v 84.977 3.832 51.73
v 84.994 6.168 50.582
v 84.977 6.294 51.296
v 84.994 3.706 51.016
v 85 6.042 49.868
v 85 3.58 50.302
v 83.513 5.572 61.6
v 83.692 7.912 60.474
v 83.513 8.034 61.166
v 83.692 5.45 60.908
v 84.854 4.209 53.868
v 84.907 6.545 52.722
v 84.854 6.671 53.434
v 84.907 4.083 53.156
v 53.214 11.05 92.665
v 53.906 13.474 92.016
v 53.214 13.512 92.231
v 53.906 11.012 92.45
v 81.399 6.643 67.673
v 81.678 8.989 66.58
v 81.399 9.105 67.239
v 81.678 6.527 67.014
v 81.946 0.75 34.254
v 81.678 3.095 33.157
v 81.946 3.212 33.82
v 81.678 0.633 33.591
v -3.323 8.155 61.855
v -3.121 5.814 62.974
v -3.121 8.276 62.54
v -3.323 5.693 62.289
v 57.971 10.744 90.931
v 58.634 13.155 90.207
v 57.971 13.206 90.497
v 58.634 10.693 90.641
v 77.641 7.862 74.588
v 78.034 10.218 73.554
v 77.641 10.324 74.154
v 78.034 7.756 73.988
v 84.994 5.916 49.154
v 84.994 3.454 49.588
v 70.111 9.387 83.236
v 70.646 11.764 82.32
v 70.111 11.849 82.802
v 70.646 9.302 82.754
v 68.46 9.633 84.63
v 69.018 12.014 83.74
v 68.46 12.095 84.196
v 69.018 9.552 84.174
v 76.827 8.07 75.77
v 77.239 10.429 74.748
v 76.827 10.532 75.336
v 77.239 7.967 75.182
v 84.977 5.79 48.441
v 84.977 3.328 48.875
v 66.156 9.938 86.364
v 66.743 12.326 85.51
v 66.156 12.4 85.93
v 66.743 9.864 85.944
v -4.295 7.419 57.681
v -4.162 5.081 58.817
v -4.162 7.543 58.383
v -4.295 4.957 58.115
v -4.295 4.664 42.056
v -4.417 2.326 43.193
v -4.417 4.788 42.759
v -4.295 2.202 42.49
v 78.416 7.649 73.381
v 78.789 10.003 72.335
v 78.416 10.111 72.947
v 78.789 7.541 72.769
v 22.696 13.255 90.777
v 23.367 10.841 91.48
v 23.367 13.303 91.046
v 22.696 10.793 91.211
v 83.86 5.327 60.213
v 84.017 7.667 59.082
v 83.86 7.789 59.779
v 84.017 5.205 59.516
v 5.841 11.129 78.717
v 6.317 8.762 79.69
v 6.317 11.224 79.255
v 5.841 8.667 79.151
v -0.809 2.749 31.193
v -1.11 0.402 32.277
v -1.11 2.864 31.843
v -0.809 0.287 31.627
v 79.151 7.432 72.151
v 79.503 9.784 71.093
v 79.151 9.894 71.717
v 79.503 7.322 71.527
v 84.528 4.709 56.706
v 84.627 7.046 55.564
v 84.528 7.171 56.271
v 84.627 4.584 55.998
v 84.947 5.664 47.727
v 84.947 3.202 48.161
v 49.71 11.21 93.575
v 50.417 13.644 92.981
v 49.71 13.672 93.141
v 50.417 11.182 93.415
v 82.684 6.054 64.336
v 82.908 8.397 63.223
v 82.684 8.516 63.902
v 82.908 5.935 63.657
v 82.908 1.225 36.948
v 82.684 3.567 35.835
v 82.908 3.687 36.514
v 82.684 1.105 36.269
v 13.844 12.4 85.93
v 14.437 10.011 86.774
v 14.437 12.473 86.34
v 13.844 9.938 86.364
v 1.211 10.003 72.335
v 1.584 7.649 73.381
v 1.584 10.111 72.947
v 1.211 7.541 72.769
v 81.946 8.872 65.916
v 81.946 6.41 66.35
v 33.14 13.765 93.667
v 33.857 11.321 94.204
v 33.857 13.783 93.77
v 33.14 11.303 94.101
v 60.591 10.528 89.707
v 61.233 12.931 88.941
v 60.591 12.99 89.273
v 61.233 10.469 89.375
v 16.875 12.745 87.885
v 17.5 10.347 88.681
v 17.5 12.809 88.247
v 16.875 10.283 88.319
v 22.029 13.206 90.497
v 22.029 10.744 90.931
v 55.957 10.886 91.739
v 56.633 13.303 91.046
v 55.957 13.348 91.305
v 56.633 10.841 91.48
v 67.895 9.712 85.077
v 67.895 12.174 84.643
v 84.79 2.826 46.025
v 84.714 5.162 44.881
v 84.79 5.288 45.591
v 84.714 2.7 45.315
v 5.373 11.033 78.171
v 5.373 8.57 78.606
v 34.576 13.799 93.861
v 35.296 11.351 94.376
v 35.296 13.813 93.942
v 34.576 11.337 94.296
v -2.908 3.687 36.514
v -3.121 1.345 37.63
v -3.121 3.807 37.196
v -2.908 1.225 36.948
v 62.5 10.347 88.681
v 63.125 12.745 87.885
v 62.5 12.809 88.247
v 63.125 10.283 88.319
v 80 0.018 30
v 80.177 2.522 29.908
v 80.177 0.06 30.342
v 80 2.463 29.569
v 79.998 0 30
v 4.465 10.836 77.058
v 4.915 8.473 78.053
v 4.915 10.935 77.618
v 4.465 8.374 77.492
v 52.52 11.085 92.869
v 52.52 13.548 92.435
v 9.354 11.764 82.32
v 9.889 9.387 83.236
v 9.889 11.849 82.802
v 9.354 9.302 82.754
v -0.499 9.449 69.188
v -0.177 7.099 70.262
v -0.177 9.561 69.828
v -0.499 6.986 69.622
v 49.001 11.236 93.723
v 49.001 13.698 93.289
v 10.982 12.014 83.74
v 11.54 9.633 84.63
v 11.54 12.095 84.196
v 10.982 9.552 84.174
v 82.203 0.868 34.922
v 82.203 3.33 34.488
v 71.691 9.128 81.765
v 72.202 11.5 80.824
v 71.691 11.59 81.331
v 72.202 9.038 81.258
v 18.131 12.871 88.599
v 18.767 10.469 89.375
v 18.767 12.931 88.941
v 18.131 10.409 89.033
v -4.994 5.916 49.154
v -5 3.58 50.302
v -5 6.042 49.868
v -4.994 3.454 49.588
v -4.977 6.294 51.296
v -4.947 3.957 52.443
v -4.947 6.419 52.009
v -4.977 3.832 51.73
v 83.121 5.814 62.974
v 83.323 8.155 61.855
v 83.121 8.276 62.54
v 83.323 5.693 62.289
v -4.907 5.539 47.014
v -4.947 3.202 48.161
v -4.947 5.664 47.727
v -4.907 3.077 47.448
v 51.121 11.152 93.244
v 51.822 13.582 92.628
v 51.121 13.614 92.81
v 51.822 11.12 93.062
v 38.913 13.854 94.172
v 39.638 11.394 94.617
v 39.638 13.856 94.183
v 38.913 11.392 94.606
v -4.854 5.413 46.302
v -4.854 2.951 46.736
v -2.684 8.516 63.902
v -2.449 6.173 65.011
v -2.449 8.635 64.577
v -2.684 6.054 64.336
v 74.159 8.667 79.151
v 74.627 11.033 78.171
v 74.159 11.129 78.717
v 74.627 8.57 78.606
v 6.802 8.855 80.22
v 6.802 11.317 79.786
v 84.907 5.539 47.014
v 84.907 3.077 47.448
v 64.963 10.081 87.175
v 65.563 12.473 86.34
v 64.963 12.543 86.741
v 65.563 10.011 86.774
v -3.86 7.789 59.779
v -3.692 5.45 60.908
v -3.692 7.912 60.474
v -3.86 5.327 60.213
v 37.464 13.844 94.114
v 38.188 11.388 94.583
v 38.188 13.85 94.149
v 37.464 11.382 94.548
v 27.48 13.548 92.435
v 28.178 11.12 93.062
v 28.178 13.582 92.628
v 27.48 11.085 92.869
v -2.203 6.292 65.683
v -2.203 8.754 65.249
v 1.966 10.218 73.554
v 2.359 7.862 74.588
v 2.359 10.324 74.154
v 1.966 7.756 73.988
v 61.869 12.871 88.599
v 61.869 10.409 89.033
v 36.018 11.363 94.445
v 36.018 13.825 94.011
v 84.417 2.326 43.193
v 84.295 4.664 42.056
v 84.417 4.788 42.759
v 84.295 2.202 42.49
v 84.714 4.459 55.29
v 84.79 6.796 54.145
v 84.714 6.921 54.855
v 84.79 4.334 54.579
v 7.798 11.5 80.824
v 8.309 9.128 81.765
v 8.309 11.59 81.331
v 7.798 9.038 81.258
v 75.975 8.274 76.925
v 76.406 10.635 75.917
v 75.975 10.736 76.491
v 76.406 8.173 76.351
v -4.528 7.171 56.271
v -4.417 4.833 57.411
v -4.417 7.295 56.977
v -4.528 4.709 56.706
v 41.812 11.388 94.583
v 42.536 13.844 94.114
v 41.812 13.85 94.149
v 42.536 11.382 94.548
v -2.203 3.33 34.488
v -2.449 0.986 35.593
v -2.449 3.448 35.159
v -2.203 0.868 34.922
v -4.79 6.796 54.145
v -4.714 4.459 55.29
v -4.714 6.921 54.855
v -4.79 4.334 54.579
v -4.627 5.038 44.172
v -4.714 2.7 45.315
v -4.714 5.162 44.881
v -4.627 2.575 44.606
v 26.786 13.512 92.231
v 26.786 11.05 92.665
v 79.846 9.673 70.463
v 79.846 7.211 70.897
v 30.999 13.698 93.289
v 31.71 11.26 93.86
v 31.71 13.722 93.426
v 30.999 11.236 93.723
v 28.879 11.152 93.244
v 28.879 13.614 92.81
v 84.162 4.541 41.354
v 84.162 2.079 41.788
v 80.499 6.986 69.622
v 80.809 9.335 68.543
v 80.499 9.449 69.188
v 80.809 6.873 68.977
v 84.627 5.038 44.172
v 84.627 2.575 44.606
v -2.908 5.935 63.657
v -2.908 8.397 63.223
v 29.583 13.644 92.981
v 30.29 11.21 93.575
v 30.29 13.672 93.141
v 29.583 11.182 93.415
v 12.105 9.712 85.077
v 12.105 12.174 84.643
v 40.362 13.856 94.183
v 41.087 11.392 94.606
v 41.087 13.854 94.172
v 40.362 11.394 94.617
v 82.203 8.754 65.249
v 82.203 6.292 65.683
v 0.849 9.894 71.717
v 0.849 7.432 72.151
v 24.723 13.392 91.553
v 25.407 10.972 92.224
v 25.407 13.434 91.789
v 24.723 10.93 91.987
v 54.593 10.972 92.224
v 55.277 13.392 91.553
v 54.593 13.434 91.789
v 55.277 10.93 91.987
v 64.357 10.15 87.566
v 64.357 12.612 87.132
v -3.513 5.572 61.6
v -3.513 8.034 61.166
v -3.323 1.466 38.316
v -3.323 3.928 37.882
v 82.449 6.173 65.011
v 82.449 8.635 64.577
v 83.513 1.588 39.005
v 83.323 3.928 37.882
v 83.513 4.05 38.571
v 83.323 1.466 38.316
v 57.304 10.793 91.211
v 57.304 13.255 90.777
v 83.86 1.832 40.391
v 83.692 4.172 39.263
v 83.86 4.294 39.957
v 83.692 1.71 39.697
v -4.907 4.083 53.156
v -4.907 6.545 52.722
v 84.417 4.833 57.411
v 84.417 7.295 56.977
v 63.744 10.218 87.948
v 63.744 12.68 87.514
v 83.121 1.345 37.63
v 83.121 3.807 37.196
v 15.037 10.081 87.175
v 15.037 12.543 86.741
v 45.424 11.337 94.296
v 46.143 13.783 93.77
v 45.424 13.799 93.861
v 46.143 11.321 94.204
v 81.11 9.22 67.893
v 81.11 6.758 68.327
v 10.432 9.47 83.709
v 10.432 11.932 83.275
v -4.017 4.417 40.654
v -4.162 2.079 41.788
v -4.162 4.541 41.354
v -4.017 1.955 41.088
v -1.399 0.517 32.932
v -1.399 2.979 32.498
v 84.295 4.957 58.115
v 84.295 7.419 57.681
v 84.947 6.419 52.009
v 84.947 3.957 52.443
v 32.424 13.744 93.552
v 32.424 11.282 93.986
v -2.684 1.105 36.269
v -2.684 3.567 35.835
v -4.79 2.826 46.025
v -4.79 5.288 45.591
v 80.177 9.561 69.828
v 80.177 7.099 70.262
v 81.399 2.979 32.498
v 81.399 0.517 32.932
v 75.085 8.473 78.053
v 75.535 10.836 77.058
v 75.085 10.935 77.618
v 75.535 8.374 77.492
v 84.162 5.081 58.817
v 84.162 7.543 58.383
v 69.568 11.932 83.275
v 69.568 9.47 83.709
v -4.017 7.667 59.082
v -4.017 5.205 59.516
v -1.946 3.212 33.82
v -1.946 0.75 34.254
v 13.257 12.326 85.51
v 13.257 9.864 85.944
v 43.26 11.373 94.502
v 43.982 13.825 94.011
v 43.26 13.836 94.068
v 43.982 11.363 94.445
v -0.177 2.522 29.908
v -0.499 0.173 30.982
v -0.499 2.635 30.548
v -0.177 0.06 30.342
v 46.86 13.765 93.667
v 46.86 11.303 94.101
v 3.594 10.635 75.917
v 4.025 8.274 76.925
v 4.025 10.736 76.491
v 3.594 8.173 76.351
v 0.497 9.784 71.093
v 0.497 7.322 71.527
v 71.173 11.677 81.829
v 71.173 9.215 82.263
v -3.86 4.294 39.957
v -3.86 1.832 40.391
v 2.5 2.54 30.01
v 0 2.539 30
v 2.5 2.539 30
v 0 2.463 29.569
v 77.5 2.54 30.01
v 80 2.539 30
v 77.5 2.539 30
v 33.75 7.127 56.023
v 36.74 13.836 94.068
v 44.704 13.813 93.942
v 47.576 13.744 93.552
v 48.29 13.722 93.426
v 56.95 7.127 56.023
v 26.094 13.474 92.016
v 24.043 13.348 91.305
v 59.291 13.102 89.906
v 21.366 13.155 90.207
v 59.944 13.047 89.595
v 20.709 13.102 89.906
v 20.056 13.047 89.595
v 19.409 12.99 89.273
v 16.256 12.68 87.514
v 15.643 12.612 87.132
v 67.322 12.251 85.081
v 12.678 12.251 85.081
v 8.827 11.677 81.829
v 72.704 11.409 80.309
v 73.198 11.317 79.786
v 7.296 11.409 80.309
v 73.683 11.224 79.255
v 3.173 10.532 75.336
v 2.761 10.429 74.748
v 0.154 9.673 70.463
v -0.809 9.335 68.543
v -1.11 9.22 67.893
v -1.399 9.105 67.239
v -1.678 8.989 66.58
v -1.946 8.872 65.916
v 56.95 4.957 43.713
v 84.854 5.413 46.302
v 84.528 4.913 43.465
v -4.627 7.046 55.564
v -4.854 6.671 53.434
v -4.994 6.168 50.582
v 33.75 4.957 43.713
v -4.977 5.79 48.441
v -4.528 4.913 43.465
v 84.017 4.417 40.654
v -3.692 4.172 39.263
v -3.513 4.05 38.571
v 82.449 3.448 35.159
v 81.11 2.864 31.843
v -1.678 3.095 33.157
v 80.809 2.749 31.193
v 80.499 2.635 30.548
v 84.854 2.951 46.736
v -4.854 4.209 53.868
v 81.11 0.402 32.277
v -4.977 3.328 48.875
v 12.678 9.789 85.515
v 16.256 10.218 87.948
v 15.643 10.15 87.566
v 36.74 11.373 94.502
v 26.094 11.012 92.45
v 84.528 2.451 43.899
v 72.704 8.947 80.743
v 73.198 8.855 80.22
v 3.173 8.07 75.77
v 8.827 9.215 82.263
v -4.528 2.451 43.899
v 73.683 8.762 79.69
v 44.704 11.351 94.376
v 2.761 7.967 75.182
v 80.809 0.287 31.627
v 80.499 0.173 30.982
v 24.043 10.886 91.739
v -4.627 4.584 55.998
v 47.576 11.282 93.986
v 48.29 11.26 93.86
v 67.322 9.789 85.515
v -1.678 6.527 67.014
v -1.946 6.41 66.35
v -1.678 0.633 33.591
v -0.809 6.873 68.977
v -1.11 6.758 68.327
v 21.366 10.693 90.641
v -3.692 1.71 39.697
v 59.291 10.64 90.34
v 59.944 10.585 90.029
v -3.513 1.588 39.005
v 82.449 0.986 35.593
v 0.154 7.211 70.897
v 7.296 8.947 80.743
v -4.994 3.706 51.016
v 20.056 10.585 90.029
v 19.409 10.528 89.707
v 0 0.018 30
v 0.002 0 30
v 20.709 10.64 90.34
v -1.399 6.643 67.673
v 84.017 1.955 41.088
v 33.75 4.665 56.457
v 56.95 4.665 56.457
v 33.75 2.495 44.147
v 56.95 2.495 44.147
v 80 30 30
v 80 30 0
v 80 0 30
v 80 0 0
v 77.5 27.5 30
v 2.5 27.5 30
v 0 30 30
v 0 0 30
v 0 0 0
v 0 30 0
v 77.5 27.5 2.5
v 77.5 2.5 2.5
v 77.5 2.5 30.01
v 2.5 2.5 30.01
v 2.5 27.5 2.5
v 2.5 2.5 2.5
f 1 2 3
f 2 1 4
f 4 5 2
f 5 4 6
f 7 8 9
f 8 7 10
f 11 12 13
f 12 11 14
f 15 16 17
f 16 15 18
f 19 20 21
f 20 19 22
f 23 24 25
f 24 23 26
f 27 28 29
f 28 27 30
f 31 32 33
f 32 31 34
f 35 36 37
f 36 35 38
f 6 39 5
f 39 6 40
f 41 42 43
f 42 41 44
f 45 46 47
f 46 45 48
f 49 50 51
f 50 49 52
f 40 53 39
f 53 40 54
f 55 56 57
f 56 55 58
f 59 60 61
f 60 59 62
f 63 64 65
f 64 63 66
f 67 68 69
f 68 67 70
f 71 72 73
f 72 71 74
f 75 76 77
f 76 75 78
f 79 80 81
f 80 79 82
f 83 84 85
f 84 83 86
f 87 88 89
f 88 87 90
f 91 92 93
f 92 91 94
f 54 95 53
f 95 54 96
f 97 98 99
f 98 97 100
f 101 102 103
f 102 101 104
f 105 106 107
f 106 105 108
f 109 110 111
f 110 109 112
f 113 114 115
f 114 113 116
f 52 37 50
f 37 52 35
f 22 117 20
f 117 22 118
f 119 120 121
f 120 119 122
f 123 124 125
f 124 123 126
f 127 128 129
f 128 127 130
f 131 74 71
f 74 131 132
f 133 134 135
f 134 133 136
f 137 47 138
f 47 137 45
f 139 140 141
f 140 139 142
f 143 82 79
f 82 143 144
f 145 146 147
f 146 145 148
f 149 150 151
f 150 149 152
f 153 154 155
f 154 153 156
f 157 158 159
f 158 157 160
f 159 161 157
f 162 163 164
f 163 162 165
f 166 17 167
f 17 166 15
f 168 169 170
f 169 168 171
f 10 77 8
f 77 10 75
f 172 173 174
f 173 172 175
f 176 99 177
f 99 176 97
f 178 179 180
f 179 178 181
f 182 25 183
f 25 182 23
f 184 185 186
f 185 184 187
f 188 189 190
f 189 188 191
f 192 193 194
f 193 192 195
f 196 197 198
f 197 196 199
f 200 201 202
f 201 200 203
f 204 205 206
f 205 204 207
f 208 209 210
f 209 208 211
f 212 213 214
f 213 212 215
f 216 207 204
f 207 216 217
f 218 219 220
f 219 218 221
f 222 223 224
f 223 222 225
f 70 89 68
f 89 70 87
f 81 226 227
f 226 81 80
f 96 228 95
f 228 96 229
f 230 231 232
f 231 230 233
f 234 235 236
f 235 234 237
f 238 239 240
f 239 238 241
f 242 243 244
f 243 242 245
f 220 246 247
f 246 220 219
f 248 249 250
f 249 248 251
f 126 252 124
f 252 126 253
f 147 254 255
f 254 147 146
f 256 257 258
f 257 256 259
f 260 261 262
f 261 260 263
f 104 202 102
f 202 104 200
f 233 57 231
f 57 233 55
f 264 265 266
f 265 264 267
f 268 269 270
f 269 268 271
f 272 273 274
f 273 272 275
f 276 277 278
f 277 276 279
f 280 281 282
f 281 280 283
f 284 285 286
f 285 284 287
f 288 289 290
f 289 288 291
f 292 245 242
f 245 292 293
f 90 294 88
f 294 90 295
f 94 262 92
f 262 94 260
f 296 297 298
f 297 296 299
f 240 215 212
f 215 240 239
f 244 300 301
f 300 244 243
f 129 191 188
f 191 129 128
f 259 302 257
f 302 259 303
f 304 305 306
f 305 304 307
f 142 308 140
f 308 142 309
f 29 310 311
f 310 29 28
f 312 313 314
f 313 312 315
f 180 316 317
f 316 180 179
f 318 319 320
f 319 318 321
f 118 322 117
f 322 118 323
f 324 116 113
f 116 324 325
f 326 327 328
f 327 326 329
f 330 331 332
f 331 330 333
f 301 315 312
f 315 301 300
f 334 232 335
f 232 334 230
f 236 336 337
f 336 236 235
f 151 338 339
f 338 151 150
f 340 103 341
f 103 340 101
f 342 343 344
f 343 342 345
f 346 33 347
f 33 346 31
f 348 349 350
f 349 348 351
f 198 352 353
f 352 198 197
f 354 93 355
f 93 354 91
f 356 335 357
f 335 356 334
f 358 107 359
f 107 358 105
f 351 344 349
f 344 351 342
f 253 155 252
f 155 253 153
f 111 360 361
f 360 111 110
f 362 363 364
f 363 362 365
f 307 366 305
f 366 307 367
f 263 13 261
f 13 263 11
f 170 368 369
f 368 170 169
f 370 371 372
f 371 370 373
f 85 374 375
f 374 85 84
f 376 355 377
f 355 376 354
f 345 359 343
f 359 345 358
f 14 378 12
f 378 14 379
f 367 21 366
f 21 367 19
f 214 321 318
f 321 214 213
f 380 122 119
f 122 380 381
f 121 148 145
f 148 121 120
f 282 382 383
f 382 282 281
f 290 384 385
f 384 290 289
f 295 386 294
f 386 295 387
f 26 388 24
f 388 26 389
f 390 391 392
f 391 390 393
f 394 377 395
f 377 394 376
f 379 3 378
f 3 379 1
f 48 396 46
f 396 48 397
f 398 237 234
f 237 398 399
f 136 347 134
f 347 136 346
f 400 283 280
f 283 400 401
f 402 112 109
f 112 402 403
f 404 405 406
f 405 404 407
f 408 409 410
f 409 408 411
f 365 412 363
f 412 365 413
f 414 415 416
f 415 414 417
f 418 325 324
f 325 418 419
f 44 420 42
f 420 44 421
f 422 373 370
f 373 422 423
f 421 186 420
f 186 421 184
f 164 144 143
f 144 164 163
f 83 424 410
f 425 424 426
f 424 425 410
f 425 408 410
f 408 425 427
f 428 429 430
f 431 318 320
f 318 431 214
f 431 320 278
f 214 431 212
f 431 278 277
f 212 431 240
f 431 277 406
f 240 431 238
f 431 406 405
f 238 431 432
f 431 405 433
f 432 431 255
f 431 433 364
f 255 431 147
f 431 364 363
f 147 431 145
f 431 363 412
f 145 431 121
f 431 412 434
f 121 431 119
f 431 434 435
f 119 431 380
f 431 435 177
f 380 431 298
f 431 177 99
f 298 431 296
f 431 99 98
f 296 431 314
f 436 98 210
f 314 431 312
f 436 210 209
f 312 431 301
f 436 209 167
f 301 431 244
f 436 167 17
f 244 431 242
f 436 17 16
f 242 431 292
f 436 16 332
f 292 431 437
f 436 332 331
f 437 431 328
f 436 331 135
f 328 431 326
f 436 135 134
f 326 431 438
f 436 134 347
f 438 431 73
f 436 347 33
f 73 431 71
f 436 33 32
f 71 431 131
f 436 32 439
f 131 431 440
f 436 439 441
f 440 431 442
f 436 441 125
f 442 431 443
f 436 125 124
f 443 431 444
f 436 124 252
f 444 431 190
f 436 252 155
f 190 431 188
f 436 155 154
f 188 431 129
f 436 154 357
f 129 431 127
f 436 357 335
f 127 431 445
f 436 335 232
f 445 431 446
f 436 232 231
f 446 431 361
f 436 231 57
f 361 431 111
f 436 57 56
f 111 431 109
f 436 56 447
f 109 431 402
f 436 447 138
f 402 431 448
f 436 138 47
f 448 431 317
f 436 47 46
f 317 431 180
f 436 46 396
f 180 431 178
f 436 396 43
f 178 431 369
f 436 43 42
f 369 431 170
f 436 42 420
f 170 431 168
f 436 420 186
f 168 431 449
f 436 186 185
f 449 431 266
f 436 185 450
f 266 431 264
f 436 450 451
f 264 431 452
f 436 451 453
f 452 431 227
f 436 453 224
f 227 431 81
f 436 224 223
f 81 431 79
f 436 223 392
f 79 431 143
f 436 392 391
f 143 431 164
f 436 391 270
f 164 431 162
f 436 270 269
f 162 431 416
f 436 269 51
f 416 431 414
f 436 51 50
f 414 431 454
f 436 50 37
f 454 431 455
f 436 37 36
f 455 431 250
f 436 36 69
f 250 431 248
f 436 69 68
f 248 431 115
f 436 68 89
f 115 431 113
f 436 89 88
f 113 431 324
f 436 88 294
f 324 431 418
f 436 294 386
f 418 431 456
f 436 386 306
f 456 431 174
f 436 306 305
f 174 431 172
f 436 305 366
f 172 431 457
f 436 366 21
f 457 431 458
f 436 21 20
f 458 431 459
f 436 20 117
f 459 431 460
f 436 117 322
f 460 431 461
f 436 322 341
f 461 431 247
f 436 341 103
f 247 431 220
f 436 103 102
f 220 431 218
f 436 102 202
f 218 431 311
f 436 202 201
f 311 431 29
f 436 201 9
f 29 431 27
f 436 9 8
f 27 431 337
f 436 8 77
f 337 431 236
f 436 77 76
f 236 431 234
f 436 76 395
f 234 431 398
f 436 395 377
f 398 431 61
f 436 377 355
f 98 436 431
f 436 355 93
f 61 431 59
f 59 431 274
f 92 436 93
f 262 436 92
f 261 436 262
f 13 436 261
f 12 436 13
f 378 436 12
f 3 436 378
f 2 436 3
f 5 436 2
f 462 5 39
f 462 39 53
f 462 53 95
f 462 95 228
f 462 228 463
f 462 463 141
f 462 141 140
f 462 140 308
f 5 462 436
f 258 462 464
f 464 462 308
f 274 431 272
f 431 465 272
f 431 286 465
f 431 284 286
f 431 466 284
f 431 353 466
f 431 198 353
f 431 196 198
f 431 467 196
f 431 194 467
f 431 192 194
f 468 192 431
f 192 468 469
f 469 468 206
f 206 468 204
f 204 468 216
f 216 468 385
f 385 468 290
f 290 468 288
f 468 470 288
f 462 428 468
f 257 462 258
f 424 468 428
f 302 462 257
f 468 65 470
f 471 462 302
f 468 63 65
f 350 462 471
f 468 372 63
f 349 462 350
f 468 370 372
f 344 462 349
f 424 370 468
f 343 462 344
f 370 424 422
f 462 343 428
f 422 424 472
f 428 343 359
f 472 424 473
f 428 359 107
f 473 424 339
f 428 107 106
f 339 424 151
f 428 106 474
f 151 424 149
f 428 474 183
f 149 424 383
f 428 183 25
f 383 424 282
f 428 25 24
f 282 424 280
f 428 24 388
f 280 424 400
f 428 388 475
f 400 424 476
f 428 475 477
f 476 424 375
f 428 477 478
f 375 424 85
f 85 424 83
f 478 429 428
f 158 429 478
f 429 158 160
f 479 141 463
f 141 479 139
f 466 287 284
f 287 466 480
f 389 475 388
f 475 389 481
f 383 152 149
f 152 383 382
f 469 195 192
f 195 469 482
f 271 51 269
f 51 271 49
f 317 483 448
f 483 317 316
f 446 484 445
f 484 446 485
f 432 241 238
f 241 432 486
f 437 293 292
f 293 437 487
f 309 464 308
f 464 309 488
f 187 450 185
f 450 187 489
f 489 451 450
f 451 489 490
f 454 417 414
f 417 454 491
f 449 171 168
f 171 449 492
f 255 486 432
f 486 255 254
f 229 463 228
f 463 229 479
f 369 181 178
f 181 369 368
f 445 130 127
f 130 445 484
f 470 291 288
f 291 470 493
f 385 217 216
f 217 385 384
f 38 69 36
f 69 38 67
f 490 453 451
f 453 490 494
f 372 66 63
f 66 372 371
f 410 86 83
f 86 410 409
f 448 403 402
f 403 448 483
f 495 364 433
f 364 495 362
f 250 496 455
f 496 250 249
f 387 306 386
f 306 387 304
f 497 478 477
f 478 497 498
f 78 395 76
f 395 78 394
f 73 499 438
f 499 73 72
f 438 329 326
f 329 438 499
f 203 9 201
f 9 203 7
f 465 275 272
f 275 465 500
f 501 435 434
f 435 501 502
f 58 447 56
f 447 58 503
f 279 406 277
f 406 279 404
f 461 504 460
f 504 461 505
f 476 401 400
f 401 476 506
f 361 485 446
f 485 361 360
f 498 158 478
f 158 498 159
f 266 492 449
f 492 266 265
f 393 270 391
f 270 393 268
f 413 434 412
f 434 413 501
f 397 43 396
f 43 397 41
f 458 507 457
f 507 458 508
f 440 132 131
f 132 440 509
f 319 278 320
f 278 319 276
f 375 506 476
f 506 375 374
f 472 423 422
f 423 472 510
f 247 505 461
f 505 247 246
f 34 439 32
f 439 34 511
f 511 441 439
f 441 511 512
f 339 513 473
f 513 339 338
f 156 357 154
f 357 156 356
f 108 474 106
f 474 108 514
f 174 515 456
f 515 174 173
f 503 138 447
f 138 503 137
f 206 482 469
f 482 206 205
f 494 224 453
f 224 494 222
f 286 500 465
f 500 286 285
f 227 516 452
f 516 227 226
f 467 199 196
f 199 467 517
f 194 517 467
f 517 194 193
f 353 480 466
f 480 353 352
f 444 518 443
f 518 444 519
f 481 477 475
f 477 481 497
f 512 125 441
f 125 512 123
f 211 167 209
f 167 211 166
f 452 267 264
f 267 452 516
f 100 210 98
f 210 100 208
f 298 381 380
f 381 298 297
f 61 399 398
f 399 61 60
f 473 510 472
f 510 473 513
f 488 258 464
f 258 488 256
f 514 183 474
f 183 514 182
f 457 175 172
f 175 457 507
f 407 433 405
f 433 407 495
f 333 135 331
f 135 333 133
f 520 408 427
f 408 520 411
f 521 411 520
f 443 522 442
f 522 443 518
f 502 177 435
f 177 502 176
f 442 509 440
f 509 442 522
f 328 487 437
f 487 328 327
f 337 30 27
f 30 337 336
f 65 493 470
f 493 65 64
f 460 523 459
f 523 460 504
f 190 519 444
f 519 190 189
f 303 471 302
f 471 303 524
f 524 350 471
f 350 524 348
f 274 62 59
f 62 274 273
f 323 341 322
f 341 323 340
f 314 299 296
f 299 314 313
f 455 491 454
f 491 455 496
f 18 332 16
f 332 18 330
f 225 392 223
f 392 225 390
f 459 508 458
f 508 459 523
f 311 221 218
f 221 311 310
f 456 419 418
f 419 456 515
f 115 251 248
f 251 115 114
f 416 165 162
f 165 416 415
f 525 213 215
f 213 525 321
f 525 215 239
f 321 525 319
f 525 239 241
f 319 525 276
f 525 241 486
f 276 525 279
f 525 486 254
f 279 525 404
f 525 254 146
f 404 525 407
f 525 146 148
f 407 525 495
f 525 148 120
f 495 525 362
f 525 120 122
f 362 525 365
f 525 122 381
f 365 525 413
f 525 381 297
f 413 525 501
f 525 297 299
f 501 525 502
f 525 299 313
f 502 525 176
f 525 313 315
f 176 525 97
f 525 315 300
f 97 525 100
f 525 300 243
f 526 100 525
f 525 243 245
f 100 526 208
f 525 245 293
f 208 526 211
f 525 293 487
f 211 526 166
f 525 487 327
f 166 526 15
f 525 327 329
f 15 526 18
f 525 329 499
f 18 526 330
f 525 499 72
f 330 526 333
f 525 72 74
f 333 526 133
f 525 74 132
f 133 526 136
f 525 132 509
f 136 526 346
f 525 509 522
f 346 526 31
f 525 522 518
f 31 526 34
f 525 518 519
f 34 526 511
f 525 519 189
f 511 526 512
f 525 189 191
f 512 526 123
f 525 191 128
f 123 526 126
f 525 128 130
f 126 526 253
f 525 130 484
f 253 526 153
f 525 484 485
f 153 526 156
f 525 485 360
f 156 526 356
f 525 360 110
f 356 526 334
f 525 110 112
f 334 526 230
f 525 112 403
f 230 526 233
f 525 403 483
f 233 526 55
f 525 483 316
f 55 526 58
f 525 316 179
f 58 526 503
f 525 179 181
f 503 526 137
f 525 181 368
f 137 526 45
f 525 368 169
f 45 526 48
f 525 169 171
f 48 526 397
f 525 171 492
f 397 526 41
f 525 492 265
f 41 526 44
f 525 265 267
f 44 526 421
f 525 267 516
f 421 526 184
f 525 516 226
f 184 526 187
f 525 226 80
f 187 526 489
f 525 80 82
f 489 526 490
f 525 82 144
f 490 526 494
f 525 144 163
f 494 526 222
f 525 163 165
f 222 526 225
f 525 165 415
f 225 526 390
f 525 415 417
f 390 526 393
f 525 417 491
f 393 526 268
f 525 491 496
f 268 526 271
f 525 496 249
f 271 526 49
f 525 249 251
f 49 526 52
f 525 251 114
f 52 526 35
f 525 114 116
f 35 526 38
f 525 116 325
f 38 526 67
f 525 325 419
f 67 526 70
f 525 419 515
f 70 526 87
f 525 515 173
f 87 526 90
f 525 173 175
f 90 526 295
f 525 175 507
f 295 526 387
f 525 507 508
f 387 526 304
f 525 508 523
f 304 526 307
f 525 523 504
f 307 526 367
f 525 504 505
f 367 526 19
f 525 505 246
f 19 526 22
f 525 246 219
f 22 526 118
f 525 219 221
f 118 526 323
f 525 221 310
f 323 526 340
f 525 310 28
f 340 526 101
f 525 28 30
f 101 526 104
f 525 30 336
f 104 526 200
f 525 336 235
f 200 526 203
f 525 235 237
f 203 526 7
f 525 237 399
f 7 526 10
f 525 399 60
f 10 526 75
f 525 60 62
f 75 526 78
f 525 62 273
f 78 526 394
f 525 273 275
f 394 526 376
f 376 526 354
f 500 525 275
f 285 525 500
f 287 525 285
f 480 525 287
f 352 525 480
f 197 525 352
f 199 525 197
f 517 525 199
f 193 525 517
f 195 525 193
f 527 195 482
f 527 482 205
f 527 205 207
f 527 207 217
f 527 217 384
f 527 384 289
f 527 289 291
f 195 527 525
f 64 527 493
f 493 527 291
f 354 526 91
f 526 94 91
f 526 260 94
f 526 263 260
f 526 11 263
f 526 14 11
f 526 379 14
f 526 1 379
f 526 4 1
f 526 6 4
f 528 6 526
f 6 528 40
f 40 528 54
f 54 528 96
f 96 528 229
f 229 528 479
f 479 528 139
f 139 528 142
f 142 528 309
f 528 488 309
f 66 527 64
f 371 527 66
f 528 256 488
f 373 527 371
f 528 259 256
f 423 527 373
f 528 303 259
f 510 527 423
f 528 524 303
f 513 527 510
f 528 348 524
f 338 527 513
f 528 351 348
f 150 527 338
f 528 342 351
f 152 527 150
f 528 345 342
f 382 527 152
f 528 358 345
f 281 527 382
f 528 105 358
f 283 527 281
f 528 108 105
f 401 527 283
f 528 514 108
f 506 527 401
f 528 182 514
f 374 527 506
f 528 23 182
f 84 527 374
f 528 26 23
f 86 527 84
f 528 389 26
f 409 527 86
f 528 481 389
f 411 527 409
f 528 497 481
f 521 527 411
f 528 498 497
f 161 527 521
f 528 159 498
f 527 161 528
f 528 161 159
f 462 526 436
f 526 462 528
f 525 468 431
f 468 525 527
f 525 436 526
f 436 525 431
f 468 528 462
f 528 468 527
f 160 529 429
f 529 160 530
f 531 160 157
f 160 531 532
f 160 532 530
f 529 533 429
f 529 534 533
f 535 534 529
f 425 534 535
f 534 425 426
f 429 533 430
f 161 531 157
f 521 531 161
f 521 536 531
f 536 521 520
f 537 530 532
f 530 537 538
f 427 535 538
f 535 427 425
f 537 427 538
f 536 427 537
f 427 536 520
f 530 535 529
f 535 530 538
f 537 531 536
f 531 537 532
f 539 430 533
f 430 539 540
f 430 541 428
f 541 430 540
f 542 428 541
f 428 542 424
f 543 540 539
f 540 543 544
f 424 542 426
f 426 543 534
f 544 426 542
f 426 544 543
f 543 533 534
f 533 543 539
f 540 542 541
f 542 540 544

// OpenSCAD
// servo info
s_padding = 0.7; // total

// measured
s_w = 12.5;
s_d = 22.5 + s_padding;
s_h = 22.5 + s_padding;
s_top_to_flange = 4;
s_flange=2.2;
s_bulge_d=14.6;
s_bulge_small_d = 5.6;

// desired

base_w=80;
base_d=30;
base_h=30;
face_r=45;
t=2.5;
face_a=80; // from vertical

// calculated
// (base_w/2)^2 + (fcfb)^2 = face_r^2
face_c_h = sqrt(face_r^2 - (base_w/2)^2);

// servo cutout is rectanlge, s_d wide and s_h high
// center of axle will be (s_w/2) to the right

$fn=390;
$fs=1;
$fa=0.04;

module face() {
    difference() {
                        cylinder(h=t,r=face_r);
                        translate([-face_r,-face_r,-0.01]) cube([2*face_r,face_r-face_c_h,t+0.02]);
           translate([-s_w/2,-s_w/2,-0.01]) cube([s_d,s_w,t+0.02]);
                    }
}

module final() {
    difference() {
        union () {
            cube([base_w,base_d,base_h]);
            
            translate([base_w/2,face_c_h*cos(face_a),base_h+face_c_h*sin(face_a)])
                rotate([face_a,0,0])
                    translate([0,0,-t])
                        face();
        }
        translate([t,t,t]) cube([base_w-2*t,base_d-2*t,base_h-t+0.01]);
    }
}

final();
// test
/*
intersection() {
    
face();
    translate([-s_w/2-2,-s_w/2-2]) cube([s_d+4,s_w+4,10]);
}
*/
